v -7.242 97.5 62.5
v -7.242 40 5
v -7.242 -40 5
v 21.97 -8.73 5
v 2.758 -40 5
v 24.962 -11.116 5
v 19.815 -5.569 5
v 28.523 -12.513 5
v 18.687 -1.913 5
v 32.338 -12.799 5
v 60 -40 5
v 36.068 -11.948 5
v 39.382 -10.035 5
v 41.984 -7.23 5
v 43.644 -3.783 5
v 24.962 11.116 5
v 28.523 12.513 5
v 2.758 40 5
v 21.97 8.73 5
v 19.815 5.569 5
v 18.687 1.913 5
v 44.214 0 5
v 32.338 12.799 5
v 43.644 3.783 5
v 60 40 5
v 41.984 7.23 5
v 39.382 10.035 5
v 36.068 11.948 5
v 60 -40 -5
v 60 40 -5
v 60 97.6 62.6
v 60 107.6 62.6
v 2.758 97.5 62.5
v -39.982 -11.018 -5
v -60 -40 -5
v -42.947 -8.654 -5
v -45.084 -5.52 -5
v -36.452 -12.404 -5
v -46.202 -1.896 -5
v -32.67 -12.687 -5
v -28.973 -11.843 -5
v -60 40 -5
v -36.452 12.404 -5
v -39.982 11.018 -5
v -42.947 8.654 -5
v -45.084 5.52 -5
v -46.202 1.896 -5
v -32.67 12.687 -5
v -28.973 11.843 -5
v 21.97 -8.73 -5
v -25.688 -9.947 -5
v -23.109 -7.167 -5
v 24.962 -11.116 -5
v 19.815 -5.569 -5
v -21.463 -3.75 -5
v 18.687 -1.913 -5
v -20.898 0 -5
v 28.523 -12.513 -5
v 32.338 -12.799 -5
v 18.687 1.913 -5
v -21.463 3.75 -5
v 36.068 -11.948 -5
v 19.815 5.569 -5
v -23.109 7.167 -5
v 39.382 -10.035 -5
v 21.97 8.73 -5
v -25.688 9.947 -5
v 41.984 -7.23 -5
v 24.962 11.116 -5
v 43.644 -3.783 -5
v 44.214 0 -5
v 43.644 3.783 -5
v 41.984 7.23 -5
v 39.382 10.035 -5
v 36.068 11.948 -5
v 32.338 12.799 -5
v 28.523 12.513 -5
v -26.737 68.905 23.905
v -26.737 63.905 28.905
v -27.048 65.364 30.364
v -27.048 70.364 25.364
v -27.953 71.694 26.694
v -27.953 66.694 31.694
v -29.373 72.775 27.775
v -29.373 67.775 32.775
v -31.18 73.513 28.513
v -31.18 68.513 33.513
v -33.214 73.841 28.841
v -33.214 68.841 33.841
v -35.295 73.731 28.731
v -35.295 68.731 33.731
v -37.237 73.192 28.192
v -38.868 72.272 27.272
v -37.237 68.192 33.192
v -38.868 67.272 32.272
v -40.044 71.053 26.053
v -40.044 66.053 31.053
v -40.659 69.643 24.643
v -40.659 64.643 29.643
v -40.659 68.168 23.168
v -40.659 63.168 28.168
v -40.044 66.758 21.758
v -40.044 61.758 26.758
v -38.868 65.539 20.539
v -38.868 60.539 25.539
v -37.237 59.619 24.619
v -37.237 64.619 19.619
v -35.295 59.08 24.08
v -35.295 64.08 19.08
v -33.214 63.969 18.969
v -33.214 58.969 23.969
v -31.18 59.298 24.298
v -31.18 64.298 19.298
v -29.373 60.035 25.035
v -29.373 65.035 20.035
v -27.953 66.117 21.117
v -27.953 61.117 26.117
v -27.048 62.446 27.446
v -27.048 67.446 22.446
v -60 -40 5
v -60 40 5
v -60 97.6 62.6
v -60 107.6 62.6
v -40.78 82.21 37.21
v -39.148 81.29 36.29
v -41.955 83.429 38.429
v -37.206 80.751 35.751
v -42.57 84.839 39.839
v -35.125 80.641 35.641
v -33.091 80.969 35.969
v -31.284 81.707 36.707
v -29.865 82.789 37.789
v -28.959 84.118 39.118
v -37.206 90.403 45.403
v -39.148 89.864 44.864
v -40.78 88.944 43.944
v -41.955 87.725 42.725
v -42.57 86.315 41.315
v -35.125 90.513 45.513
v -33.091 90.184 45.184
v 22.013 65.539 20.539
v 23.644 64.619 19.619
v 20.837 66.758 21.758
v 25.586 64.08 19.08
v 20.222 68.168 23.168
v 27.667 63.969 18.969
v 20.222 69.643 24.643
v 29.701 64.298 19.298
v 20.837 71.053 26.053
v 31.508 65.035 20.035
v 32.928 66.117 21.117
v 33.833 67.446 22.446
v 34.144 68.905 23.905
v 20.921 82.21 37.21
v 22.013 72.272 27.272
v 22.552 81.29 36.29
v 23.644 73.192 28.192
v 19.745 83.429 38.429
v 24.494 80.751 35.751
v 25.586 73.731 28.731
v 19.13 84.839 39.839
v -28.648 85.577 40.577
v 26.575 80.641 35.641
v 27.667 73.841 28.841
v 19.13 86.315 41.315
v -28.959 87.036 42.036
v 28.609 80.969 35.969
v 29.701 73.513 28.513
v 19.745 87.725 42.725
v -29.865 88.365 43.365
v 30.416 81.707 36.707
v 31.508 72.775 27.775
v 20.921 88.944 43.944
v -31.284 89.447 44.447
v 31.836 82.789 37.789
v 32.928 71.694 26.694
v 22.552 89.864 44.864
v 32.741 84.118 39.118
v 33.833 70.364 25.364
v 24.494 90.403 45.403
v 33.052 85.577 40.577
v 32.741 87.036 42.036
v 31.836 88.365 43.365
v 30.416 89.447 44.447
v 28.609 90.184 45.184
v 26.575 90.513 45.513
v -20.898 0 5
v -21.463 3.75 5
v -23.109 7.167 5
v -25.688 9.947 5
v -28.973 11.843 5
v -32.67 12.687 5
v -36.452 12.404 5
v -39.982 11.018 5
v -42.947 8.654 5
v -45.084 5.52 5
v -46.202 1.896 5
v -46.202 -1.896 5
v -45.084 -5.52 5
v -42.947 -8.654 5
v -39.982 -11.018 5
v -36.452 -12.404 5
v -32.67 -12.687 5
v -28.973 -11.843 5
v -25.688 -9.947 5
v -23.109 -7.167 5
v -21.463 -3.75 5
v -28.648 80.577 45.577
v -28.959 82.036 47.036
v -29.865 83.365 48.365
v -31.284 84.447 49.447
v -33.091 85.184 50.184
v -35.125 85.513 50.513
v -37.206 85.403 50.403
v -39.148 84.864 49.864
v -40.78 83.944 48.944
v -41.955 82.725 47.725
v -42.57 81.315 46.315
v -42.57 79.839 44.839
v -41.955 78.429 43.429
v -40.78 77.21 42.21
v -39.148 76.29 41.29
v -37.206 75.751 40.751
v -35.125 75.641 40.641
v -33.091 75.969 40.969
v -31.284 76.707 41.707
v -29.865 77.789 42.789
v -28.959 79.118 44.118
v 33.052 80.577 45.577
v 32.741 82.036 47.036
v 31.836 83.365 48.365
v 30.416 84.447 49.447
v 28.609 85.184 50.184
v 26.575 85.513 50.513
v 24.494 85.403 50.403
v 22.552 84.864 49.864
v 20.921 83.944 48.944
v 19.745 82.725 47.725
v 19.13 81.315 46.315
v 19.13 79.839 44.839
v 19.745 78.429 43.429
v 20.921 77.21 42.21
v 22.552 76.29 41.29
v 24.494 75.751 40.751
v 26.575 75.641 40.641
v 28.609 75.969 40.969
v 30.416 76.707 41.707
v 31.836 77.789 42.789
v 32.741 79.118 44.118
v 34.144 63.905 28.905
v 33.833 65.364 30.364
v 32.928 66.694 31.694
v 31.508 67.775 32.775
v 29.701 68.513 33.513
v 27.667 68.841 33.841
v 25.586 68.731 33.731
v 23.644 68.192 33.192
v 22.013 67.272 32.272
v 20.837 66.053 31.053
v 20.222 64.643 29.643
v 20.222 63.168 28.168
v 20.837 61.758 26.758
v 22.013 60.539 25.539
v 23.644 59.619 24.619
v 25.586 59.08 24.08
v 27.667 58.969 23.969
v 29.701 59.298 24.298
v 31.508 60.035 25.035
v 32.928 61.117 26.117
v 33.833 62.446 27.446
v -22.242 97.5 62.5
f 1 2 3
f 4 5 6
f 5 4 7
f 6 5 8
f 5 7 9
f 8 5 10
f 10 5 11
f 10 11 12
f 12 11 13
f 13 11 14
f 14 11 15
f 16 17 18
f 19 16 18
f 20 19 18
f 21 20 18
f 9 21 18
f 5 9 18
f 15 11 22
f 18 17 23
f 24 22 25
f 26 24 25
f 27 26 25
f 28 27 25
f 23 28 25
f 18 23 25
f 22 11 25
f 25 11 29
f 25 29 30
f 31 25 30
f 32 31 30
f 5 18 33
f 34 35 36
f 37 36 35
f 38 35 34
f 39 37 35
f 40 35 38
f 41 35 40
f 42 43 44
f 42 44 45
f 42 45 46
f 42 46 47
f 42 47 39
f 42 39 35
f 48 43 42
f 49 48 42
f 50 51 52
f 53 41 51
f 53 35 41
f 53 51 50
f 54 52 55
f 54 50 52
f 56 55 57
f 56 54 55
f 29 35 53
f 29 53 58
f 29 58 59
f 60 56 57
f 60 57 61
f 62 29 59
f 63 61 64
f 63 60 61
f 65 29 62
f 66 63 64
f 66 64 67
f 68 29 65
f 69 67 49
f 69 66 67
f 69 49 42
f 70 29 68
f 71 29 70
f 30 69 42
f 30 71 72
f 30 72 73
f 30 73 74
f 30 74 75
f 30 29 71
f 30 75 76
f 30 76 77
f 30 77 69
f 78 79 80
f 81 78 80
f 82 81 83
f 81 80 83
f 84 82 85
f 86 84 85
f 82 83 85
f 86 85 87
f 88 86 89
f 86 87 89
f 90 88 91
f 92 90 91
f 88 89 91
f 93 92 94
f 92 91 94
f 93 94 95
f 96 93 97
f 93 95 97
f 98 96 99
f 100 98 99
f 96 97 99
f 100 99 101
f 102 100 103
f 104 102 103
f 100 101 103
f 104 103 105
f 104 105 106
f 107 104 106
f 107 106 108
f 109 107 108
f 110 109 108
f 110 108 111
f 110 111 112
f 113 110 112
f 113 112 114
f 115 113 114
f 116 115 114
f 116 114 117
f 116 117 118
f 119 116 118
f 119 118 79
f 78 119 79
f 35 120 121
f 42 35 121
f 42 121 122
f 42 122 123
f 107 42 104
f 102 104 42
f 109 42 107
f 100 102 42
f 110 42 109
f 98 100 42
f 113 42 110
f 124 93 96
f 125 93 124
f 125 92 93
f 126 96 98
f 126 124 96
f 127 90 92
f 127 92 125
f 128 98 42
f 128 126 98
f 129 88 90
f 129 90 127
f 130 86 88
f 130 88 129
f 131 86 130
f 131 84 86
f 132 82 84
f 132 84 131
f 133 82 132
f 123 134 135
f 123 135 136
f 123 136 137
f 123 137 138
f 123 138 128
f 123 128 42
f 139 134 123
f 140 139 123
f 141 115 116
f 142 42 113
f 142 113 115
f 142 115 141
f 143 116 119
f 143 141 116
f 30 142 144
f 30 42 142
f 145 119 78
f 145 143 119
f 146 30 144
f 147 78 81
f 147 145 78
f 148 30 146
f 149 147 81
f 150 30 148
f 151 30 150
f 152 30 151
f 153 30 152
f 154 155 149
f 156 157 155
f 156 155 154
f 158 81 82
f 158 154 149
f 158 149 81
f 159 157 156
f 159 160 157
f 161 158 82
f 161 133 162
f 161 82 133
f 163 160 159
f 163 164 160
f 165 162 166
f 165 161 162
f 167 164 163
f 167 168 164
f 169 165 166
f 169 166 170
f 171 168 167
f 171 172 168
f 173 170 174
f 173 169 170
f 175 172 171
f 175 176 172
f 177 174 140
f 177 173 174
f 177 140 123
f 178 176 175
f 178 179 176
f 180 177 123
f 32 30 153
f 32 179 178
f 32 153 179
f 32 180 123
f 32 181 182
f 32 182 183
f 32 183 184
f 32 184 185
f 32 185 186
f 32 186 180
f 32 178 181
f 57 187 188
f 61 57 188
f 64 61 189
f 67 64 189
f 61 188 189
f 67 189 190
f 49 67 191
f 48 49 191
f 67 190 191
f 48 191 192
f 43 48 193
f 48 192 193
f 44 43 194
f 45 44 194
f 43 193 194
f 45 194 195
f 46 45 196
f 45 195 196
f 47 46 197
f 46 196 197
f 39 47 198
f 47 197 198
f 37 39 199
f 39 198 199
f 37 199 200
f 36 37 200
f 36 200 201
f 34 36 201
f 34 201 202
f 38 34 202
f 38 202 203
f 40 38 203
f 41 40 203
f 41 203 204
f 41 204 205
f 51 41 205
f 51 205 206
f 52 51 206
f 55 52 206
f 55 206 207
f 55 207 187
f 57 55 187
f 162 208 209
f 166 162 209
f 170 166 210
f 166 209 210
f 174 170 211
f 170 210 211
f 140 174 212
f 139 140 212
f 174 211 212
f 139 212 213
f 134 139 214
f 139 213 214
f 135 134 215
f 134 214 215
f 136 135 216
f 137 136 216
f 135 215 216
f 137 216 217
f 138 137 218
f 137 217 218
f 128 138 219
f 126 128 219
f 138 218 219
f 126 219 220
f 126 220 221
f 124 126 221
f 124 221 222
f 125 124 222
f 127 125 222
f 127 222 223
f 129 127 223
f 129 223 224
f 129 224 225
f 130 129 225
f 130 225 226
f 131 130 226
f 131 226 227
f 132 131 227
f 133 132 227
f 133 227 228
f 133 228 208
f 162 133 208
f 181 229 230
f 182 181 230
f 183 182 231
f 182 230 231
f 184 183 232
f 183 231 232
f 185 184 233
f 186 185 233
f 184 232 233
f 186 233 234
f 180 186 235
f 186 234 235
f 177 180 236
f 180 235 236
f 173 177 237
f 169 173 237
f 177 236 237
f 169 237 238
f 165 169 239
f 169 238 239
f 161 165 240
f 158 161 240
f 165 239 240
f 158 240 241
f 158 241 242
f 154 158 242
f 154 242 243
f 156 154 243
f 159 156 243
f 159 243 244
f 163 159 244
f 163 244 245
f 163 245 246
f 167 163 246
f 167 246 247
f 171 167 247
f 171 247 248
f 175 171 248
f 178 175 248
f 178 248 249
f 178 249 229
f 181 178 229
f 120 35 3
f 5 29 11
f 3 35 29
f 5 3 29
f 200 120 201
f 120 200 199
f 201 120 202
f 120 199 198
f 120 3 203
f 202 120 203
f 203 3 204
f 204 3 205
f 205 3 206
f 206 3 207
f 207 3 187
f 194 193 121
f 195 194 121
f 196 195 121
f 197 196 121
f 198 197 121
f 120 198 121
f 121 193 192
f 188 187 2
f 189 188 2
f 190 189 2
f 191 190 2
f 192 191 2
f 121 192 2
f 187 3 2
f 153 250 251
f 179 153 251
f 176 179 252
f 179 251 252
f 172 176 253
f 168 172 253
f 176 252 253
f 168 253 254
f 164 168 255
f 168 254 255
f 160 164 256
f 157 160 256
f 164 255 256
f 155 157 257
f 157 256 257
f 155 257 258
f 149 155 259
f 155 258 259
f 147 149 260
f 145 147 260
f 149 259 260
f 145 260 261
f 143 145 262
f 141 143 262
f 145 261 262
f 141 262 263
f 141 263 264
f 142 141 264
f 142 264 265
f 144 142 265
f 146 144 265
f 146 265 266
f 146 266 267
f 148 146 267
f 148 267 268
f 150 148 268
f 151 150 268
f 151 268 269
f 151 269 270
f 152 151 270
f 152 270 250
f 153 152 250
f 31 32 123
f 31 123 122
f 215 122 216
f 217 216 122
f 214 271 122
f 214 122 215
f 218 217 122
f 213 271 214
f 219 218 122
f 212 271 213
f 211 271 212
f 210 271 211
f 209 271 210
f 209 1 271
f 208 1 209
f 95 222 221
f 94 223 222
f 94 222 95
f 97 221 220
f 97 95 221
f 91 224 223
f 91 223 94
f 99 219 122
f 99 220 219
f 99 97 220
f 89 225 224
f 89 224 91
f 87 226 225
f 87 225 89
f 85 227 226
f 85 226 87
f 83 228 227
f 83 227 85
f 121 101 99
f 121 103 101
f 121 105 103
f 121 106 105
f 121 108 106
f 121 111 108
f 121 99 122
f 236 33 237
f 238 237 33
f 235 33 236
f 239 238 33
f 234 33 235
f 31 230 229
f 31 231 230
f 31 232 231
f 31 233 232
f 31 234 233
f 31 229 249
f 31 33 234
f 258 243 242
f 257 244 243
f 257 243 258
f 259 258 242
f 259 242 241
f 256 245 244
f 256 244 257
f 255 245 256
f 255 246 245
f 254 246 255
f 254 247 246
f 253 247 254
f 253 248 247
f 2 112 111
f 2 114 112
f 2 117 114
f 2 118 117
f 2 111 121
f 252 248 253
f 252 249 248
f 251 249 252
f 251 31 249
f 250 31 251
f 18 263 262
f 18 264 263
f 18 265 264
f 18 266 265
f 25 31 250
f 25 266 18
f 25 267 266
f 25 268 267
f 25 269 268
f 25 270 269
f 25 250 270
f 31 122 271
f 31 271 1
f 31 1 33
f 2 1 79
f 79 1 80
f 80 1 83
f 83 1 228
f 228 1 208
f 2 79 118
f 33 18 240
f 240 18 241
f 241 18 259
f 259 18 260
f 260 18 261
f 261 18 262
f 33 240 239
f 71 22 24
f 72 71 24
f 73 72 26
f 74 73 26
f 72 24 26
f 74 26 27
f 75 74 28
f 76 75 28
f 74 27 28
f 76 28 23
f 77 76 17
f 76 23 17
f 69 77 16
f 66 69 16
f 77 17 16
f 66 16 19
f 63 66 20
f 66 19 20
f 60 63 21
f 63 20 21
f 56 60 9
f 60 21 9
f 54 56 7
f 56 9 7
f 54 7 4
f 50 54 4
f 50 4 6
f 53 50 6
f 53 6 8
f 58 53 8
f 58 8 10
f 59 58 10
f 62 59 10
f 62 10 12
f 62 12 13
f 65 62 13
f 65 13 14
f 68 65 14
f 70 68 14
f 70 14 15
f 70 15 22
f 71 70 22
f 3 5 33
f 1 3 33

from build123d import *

# Parameters (mm, degrees)
F0_W      = 80
F0_H      = 10
F1_DEPTH  = 60
F2_W      = 10
F2_H      = 137.5997612298
F3_DEPTH  = 62.5
F5_DEPTH  = 25
F7_DEPTH  = 25
F8_R      = 7
F9_DEPTH  = 54.8723173841
F10_R     = 12.8351278785
F11_DEPTH = 10.001
F12_R     = 12.7228131032
F13_DEPTH = 10.001


with BuildPart() as f1:
    # F0 (on Right) → F1 (new body, symmetric)
    with BuildSketch(Plane.YZ):
        Rectangle(F0_W, F0_H)
        Polygon((40, 5), (40, -5), (107.5997612298, 62.5997612298), (97.5997612298, 62.5997612298), align=None)
    extrude(amount=F1_DEPTH, both=True)

    # F2 (on Top) → F3 (join)
    with BuildSketch(Plane.XY):
        with Locations((-2.2415908799, 28.7998806149)):
            Rectangle(F2_W, F2_H)
    extrude(amount=F3_DEPTH)

    # F4 (on face) → F5 (cut)
    with BuildSketch(Plane.YZ.offset(2.7584091201)):
        Polygon((-40, 62.5), (-40, 5), (97.5, 62.5), align=None)
    extrude(amount=-F5_DEPTH, mode=Mode.SUBTRACT)

    # F6 (on face) → F7 (cut)
    with BuildSketch(Plane.YZ.offset(2.7584091201)):
        Polygon((97.5997612298, 52.5997612298), (45, 0), (97.5997612298, 0), align=None)
    extrude(amount=-F7_DEPTH, mode=Mode.SUBTRACT)

    # F8 (on face) → F9 (cut, through all)
    with BuildSketch(Plane(origin=(0, 17.5, -17.5), x_dir=(1, 0, 0), z_dir=(0, -0.7071067812, 0.7071067812))):
        with Locations((26.0520085543, 89.2042198464)):
            Circle(F8_R)
        with Locations((27.1440549599, 65.627058422)):
            Circle(F8_R)
        with Locations((-35.6482013747, 89.2042198464)):
            Circle(F8_R)
        with Locations((-33.7371340773, 65.627058422)):
            Circle(F8_R)
    extrude(amount=-F9_DEPTH, mode=Mode.SUBTRACT)

    # F10 (on face) → F11 (cut, through all)
    with BuildSketch(Plane.XY.offset(5)):
        with Locations((31.3792045601, 0)):
            Circle(F10_R)
    extrude(amount=-F11_DEPTH, mode=Mode.SUBTRACT)

    # F12 (on face) → F13 (cut, through all)
    with BuildSketch(Plane.XY.offset(5)):
        with Locations((-33.6207954399, 0)):
            Circle(F12_R)
    extrude(amount=-F13_DEPTH, mode=Mode.SUBTRACT)


solid = f1.part
